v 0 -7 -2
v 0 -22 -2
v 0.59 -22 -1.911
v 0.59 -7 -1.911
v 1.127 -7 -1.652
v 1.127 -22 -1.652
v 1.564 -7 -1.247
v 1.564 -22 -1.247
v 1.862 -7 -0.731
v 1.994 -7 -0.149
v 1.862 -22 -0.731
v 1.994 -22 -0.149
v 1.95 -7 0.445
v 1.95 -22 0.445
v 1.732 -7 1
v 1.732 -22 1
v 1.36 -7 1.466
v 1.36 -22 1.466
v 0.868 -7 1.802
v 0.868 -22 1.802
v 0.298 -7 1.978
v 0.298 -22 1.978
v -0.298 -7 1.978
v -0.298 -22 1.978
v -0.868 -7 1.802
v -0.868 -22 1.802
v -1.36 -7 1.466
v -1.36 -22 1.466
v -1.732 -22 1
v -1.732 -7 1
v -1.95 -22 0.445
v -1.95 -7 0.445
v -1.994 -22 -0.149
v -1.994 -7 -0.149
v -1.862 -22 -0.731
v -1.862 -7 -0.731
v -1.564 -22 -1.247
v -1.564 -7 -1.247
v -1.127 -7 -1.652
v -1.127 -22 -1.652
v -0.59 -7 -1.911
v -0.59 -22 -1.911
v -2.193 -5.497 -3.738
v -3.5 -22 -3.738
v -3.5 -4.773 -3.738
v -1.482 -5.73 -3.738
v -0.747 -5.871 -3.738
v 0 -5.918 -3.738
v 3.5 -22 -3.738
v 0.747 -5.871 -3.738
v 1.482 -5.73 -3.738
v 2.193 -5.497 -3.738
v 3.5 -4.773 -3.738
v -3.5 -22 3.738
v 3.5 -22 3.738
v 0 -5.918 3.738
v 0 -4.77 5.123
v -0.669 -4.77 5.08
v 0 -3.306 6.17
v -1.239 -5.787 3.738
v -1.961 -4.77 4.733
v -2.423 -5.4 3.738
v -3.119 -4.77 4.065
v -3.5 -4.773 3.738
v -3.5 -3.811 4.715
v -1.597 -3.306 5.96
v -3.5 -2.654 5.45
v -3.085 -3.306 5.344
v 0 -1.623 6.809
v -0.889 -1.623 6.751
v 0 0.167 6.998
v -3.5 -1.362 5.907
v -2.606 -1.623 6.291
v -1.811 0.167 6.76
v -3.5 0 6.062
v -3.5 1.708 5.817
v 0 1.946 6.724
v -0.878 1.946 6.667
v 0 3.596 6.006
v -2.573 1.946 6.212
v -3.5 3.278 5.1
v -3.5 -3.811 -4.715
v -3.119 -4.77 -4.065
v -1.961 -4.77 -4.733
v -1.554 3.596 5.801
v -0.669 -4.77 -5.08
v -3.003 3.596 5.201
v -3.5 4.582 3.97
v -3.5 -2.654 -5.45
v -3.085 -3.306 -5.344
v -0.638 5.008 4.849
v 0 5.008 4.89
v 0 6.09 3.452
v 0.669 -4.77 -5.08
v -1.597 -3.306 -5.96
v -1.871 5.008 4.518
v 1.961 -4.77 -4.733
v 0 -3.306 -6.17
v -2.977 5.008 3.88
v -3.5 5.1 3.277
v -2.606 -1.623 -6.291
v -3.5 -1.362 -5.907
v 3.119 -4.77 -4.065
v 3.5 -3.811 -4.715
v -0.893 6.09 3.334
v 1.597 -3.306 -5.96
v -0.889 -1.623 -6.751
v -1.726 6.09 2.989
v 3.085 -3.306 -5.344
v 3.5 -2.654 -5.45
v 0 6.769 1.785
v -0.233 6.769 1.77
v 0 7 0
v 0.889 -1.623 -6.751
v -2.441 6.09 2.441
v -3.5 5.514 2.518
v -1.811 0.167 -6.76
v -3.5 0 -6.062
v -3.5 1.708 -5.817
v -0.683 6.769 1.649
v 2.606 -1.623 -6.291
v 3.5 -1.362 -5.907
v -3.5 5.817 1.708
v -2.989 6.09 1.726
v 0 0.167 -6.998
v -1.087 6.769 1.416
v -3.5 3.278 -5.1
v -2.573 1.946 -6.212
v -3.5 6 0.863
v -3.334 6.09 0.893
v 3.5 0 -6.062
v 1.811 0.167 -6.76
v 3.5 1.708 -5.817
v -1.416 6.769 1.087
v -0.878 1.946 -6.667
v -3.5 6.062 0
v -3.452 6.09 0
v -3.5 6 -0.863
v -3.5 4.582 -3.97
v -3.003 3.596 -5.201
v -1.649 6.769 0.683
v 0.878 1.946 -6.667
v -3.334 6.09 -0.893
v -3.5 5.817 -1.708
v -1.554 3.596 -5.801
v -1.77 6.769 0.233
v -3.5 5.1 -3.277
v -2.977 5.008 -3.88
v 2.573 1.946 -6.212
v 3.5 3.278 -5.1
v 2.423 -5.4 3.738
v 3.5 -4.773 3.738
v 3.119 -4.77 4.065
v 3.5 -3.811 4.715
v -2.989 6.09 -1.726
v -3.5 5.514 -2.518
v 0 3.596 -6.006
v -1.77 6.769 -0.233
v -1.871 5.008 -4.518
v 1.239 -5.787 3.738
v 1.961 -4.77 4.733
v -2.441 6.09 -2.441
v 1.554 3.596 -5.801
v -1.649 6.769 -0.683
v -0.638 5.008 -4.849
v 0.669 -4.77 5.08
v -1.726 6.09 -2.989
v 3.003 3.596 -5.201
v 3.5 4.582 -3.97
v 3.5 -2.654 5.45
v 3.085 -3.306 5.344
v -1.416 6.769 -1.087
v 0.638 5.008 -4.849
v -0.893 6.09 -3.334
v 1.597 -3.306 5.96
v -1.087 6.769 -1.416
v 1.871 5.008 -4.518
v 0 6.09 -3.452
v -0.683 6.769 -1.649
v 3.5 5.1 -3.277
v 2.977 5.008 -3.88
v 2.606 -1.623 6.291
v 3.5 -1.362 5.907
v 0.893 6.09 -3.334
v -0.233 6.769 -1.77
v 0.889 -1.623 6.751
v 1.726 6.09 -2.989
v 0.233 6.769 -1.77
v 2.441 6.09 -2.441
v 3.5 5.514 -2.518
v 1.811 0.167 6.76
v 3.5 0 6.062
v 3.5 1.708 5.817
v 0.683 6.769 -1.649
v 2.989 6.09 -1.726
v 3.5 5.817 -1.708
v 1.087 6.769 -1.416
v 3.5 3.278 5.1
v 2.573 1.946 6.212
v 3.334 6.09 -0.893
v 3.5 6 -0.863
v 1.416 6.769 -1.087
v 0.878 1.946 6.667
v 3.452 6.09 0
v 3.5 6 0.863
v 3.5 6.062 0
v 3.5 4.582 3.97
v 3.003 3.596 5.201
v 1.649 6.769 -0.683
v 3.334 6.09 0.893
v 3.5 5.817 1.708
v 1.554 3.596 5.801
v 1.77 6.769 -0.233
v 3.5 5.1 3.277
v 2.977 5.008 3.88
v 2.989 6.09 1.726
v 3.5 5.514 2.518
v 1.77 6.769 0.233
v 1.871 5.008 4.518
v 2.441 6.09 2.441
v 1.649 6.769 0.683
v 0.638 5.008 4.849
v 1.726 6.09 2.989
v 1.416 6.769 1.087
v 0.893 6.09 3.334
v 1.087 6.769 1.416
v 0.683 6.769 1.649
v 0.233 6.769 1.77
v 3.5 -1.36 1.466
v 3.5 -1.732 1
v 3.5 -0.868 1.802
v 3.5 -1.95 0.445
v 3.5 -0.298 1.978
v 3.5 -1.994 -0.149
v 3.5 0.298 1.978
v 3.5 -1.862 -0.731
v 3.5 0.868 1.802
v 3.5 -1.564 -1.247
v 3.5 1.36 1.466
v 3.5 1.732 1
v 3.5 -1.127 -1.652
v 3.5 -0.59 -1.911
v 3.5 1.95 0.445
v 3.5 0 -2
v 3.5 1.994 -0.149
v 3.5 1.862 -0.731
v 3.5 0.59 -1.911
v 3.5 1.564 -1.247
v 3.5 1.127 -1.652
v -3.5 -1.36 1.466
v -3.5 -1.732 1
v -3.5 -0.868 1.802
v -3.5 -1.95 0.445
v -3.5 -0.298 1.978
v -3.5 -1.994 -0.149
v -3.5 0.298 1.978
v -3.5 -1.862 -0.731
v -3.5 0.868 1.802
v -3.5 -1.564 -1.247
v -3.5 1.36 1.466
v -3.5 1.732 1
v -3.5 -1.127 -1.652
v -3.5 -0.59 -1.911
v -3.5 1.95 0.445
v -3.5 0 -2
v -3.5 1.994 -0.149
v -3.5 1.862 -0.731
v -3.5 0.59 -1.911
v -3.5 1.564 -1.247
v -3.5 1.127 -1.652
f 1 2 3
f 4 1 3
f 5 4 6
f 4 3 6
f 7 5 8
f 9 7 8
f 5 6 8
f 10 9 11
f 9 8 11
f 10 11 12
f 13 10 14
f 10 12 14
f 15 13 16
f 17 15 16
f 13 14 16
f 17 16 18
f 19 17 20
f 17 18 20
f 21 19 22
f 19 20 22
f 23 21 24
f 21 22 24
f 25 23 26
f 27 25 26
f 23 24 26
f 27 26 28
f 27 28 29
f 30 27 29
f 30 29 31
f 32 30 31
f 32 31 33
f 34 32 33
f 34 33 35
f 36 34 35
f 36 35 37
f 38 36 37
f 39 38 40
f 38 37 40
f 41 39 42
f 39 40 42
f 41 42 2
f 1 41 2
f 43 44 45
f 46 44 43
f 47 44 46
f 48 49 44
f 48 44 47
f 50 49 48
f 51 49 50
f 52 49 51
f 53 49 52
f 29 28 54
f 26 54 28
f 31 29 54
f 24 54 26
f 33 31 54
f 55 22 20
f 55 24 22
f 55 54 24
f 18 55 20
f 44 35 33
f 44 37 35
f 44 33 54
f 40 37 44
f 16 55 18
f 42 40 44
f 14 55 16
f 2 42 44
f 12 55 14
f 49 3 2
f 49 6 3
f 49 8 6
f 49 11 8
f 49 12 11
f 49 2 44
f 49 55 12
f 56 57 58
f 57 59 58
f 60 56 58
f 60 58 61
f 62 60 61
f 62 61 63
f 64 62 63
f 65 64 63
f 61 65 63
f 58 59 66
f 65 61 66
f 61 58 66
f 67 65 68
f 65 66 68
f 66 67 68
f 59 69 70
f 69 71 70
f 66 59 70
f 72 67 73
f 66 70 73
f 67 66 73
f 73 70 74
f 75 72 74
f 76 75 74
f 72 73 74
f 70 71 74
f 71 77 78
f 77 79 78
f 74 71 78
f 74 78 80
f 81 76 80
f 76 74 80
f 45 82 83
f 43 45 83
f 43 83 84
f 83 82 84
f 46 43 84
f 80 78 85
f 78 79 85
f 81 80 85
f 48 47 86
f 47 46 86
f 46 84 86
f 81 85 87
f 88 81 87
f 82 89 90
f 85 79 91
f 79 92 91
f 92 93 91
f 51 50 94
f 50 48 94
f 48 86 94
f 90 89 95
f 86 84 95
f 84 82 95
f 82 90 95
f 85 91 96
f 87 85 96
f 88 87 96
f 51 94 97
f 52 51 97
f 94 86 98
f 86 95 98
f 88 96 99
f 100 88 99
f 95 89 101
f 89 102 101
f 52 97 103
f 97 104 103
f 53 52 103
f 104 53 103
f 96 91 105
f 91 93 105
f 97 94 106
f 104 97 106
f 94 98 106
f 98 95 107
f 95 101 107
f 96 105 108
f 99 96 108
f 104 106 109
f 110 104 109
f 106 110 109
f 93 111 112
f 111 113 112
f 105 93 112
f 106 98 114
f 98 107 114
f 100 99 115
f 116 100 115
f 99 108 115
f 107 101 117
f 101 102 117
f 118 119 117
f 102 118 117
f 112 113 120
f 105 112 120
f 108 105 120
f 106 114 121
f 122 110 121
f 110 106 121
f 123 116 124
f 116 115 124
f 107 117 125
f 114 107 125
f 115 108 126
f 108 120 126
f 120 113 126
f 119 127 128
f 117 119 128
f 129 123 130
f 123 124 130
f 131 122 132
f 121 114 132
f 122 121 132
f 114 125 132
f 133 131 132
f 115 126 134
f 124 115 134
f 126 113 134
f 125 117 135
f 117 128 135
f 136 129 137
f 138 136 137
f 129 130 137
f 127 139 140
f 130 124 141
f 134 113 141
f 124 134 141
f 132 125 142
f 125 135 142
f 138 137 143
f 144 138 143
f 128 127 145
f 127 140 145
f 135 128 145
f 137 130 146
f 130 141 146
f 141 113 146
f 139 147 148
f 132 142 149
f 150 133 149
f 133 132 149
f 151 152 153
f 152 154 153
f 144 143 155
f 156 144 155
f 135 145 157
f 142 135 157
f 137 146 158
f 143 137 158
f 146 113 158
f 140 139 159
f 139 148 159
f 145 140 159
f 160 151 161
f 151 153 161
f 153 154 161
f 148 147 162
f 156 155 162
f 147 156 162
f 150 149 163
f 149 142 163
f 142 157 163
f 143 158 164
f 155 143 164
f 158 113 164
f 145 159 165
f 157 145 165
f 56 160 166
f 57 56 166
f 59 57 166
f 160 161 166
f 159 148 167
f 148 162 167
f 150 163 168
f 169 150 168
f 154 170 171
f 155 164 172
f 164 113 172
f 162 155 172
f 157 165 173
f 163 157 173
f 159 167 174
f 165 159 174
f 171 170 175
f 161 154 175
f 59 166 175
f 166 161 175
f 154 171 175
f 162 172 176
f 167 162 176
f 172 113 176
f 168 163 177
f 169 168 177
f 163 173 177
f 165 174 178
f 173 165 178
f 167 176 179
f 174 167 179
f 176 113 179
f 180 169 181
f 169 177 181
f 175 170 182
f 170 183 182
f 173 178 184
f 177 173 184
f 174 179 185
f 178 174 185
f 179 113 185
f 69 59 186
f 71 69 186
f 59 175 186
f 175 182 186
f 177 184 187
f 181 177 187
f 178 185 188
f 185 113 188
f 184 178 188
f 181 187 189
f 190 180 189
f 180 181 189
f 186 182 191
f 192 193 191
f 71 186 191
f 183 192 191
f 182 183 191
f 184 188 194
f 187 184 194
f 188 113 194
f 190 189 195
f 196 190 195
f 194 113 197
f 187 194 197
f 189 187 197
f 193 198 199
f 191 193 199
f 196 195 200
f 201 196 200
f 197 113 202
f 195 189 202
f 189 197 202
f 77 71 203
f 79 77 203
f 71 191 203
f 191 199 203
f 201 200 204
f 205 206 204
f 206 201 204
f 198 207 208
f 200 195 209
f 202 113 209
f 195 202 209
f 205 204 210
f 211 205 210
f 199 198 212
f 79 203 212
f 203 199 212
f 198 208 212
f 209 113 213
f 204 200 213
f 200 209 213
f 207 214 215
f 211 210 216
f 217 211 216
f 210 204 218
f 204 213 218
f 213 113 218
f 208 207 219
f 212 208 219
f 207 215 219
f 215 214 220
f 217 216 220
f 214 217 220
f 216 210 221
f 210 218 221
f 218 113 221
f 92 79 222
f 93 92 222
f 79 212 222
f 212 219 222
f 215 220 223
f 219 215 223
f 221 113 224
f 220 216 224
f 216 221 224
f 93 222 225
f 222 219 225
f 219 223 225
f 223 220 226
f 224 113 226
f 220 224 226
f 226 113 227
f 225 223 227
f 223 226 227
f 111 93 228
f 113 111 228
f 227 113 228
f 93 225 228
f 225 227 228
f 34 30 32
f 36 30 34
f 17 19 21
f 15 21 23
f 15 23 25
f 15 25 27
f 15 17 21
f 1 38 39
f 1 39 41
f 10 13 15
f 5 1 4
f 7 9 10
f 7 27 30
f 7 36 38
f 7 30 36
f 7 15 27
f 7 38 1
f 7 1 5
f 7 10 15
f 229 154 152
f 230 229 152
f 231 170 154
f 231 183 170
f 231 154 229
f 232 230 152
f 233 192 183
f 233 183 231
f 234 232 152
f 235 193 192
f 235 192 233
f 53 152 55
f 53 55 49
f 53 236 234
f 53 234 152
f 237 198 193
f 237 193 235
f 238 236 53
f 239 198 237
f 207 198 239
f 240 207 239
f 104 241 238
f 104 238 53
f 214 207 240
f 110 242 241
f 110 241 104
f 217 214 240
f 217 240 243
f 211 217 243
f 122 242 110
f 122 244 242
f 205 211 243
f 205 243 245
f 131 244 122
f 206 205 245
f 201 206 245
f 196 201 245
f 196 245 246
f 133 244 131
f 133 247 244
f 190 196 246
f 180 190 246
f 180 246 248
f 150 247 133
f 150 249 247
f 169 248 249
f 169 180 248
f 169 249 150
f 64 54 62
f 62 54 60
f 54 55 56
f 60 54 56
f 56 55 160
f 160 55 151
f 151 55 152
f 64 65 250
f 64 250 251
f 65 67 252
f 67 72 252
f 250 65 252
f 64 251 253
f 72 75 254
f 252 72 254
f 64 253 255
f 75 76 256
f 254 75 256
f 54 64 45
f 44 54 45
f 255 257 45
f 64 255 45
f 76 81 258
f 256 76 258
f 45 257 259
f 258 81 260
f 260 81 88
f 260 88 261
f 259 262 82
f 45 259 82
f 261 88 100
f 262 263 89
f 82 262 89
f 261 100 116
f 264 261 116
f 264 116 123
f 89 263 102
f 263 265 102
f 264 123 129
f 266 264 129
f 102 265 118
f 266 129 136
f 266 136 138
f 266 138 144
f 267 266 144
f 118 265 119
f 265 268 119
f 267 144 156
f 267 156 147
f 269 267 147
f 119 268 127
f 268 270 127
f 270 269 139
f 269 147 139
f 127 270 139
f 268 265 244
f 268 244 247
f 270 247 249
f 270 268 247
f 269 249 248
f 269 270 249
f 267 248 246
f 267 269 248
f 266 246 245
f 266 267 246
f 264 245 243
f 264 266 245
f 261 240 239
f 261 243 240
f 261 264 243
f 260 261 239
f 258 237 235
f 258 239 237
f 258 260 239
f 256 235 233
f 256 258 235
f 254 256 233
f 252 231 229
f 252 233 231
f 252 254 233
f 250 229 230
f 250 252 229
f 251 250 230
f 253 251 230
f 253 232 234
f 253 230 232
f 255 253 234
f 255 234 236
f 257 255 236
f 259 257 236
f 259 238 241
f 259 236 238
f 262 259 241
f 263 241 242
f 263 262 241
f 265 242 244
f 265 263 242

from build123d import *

# Parameters (mm, degrees)
CUT_EXTRUDE_START        = -6.062177826
CUT_EXTRUDE_1_OUTLINE_W  = 4.5
CUT_EXTRUDE_1_OUTLINE_H  = 16
CUT_EXTRUDE_1_DEPTH      = 12.124355652
CUT_EXTRUDE_2_DEPTH      = 15.43086969
CUT_EXTRUDE_2_DEPTH_BACK = 15.43086969
SKETCH_3_R               = 2
SKETCH_4_W               = 7.475945476
SKETCH_4_H               = 17.759961534
EXTRUDE_1_DEPTH          = 7
SKETCH_5_R               = 2
CUT_EXTRUDE_3_DEPTH      = 15


# Read off the part's stored shape, not the designer's step: 切除-拉伸1
with BuildPart() as part:
    # 草图1 → 旋转1 (revolve)
    with BuildSketch(Plane(origin=(0, 0, 0), x_dir=(0, 0, -1), z_dir=(1, 0, 0))):
        with BuildLine():
            Line((0, 7), (0, -7))
            ThreePointArc((0, -7), (-7, 0), (0, 7))
        make_face()
    revolve(axis=Axis((0, 7, 0), (0, -1, 0)))

    # 切除-拉伸1 outline → 切除-拉伸1 (cut)
    with BuildSketch(Plane.XY.offset(CUT_EXTRUDE_START)):
        with Locations((-5.75, 0)):
            Rectangle(CUT_EXTRUDE_1_OUTLINE_W, CUT_EXTRUDE_1_OUTLINE_H)
        with Locations((5.75, 0)):
            Rectangle(CUT_EXTRUDE_1_OUTLINE_W, CUT_EXTRUDE_1_OUTLINE_H)
    extrude(amount=CUT_EXTRUDE_1_DEPTH, mode=Mode.SUBTRACT)

    # 草图3 → 切除-拉伸2 (cut, two sides: drawn at the far end of the back side and taken through both)
    with BuildSketch(Plane(origin=(3.5, 0, 0), x_dir=(0, 0, -1), z_dir=(1, 0, 0)).offset(-CUT_EXTRUDE_2_DEPTH_BACK)):
        Circle(SKETCH_3_R)
    extrude(amount=CUT_EXTRUDE_2_DEPTH + CUT_EXTRUDE_2_DEPTH_BACK, mode=Mode.SUBTRACT)

    # 草图4 → 凸台-拉伸1 (add)
    with BuildSketch(Plane(origin=(3.5, 0, 0), x_dir=(0, 0, -1), z_dir=(1, 0, 0))):
        with Locations((0, -13.120019233)):
            Rectangle(SKETCH_4_W, SKETCH_4_H)
    extrude(amount=-EXTRUDE_1_DEPTH)

    # 草图5 → 切除-拉伸3 (cut)
    with BuildSketch(Plane.XZ.offset(22)):
        with Locations(Location((0, 0, 0), (0, 0, 270))):
            Circle(SKETCH_5_R)
    extrude(amount=-CUT_EXTRUDE_3_DEPTH, mode=Mode.SUBTRACT)


solid = part.part
